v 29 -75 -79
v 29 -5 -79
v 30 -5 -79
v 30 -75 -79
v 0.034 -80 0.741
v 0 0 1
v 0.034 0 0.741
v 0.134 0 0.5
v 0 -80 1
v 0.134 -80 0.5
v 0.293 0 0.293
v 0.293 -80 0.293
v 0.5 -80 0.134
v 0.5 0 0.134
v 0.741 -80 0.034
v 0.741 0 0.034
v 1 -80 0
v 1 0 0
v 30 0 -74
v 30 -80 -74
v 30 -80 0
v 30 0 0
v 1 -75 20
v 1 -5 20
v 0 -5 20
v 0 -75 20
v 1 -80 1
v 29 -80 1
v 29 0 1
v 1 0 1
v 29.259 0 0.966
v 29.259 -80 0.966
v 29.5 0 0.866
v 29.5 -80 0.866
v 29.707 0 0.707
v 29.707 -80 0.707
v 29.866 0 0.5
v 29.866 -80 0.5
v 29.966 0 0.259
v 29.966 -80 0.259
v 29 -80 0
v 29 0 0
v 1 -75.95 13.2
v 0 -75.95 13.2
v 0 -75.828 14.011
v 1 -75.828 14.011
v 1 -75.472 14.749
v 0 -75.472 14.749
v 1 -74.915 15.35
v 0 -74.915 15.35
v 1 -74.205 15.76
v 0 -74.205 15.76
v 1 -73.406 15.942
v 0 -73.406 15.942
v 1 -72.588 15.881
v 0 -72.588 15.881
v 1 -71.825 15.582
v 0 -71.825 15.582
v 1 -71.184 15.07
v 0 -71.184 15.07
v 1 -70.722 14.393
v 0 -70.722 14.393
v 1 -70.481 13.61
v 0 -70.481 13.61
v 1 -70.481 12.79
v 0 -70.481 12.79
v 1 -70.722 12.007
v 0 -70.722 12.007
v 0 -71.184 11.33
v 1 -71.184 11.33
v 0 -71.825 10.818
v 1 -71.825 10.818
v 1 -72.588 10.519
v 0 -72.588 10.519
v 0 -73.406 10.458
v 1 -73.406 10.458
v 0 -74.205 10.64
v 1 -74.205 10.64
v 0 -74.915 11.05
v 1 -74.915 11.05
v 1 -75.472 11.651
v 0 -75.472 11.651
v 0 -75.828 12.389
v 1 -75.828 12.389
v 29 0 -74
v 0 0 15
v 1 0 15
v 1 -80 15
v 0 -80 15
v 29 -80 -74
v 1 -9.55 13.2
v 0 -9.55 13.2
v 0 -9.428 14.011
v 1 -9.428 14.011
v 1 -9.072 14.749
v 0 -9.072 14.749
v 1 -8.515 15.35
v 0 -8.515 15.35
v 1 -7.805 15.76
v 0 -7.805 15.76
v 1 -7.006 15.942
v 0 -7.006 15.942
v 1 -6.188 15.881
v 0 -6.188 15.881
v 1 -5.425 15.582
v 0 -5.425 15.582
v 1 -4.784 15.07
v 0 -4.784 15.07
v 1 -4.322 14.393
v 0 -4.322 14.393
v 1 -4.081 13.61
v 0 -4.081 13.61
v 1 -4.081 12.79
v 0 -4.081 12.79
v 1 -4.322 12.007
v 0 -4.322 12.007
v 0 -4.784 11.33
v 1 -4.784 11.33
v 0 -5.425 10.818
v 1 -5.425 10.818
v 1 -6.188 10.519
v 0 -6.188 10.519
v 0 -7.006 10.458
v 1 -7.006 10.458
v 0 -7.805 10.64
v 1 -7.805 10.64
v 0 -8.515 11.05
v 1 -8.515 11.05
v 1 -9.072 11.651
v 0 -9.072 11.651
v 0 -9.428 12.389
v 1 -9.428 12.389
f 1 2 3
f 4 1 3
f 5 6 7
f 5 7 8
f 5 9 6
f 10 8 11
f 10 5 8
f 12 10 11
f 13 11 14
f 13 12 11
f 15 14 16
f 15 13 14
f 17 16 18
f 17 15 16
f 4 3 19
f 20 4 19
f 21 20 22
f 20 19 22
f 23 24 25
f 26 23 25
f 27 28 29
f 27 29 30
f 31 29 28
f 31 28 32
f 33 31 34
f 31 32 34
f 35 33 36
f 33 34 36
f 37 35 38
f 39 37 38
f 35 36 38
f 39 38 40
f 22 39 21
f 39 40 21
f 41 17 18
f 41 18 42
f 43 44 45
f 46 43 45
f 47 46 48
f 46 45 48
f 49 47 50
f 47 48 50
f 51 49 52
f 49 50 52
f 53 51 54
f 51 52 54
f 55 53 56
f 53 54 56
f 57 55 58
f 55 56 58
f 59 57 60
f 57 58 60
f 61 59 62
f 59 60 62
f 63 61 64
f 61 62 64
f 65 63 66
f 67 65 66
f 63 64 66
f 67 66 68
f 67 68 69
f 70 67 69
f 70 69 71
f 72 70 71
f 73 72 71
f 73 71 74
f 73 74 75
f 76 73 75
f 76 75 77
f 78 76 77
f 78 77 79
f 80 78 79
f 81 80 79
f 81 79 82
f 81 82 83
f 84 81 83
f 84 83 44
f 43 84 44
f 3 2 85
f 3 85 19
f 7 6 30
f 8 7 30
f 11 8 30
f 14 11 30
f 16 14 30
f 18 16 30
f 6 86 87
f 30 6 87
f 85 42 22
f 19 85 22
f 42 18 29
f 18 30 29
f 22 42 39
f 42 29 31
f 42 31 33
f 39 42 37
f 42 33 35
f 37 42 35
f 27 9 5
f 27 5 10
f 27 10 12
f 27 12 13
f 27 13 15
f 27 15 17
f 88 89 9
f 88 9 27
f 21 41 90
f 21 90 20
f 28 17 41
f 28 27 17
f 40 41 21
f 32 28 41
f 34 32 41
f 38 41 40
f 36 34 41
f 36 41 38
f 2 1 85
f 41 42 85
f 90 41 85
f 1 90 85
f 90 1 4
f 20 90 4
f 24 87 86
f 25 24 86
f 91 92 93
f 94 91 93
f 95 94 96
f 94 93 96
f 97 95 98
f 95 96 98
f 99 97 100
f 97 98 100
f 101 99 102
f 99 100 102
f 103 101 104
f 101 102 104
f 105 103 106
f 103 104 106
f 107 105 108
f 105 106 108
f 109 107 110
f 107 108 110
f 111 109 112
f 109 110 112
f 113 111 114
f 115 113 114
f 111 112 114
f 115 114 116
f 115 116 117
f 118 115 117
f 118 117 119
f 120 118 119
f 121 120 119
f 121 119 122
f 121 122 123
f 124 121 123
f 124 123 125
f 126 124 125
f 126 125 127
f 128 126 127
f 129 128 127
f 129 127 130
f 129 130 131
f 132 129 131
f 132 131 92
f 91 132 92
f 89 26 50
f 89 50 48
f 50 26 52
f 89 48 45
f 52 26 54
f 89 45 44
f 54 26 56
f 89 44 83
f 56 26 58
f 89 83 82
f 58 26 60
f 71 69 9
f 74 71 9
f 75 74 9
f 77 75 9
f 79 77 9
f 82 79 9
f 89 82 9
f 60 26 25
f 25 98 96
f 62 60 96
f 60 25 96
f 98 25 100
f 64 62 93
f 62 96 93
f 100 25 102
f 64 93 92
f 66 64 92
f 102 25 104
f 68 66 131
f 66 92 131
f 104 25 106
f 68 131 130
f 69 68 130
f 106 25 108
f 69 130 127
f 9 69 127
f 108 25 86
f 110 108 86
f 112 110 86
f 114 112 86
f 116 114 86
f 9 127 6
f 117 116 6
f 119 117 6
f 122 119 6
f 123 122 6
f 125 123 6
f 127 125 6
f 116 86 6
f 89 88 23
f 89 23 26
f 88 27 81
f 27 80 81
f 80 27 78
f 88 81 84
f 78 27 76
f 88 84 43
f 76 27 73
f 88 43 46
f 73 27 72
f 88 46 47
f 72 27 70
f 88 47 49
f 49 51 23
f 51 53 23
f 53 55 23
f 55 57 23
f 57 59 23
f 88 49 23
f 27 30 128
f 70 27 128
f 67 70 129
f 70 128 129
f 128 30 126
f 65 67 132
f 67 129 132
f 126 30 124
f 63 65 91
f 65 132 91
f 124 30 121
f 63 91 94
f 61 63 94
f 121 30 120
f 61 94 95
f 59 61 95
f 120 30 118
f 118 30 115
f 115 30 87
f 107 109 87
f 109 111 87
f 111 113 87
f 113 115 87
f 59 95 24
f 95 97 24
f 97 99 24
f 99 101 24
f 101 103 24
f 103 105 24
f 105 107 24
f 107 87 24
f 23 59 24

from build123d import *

# Parameters (mm, degrees)
F1_DEPTH = 80
F3_D     = 5.5
F4_SIZE  = 5
F5_R     = 1


with BuildPart() as f1:
    # F0 (on Front) → F1 (new body)
    with BuildSketch(Plane.XZ):
        Polygon((0, 20), (0, 0), (29, 0), (29, -79), (30, -79), (30, 1), (1, 1), (1, 20), align=None)
    extrude(amount=F1_DEPTH)

    # F3 (through all)
    with Locations(Plane.YZ.offset(1)):
        with Locations((-73.2, 13.2), (-6.8, 13.2)):
            Hole(F3_D / 2)

    # F4
    f4_edges = [f1.edges().sort_by_distance(p)[0] for p in [
        (0.5, -80, 20),
        (0.5, 0, 20),
        (29.5, 0, -79),
        (29.5, -80, -79),
    ]]
    chamfer(f4_edges, length=F4_SIZE)

    # F5
    f5_edges = [f1.edges().sort_by_distance(p)[0] for p in [
        (30, -40, 1),
        (0, -40, 0),
    ]]
    fillet(f5_edges, radius=F5_R)


solid = f1.part
